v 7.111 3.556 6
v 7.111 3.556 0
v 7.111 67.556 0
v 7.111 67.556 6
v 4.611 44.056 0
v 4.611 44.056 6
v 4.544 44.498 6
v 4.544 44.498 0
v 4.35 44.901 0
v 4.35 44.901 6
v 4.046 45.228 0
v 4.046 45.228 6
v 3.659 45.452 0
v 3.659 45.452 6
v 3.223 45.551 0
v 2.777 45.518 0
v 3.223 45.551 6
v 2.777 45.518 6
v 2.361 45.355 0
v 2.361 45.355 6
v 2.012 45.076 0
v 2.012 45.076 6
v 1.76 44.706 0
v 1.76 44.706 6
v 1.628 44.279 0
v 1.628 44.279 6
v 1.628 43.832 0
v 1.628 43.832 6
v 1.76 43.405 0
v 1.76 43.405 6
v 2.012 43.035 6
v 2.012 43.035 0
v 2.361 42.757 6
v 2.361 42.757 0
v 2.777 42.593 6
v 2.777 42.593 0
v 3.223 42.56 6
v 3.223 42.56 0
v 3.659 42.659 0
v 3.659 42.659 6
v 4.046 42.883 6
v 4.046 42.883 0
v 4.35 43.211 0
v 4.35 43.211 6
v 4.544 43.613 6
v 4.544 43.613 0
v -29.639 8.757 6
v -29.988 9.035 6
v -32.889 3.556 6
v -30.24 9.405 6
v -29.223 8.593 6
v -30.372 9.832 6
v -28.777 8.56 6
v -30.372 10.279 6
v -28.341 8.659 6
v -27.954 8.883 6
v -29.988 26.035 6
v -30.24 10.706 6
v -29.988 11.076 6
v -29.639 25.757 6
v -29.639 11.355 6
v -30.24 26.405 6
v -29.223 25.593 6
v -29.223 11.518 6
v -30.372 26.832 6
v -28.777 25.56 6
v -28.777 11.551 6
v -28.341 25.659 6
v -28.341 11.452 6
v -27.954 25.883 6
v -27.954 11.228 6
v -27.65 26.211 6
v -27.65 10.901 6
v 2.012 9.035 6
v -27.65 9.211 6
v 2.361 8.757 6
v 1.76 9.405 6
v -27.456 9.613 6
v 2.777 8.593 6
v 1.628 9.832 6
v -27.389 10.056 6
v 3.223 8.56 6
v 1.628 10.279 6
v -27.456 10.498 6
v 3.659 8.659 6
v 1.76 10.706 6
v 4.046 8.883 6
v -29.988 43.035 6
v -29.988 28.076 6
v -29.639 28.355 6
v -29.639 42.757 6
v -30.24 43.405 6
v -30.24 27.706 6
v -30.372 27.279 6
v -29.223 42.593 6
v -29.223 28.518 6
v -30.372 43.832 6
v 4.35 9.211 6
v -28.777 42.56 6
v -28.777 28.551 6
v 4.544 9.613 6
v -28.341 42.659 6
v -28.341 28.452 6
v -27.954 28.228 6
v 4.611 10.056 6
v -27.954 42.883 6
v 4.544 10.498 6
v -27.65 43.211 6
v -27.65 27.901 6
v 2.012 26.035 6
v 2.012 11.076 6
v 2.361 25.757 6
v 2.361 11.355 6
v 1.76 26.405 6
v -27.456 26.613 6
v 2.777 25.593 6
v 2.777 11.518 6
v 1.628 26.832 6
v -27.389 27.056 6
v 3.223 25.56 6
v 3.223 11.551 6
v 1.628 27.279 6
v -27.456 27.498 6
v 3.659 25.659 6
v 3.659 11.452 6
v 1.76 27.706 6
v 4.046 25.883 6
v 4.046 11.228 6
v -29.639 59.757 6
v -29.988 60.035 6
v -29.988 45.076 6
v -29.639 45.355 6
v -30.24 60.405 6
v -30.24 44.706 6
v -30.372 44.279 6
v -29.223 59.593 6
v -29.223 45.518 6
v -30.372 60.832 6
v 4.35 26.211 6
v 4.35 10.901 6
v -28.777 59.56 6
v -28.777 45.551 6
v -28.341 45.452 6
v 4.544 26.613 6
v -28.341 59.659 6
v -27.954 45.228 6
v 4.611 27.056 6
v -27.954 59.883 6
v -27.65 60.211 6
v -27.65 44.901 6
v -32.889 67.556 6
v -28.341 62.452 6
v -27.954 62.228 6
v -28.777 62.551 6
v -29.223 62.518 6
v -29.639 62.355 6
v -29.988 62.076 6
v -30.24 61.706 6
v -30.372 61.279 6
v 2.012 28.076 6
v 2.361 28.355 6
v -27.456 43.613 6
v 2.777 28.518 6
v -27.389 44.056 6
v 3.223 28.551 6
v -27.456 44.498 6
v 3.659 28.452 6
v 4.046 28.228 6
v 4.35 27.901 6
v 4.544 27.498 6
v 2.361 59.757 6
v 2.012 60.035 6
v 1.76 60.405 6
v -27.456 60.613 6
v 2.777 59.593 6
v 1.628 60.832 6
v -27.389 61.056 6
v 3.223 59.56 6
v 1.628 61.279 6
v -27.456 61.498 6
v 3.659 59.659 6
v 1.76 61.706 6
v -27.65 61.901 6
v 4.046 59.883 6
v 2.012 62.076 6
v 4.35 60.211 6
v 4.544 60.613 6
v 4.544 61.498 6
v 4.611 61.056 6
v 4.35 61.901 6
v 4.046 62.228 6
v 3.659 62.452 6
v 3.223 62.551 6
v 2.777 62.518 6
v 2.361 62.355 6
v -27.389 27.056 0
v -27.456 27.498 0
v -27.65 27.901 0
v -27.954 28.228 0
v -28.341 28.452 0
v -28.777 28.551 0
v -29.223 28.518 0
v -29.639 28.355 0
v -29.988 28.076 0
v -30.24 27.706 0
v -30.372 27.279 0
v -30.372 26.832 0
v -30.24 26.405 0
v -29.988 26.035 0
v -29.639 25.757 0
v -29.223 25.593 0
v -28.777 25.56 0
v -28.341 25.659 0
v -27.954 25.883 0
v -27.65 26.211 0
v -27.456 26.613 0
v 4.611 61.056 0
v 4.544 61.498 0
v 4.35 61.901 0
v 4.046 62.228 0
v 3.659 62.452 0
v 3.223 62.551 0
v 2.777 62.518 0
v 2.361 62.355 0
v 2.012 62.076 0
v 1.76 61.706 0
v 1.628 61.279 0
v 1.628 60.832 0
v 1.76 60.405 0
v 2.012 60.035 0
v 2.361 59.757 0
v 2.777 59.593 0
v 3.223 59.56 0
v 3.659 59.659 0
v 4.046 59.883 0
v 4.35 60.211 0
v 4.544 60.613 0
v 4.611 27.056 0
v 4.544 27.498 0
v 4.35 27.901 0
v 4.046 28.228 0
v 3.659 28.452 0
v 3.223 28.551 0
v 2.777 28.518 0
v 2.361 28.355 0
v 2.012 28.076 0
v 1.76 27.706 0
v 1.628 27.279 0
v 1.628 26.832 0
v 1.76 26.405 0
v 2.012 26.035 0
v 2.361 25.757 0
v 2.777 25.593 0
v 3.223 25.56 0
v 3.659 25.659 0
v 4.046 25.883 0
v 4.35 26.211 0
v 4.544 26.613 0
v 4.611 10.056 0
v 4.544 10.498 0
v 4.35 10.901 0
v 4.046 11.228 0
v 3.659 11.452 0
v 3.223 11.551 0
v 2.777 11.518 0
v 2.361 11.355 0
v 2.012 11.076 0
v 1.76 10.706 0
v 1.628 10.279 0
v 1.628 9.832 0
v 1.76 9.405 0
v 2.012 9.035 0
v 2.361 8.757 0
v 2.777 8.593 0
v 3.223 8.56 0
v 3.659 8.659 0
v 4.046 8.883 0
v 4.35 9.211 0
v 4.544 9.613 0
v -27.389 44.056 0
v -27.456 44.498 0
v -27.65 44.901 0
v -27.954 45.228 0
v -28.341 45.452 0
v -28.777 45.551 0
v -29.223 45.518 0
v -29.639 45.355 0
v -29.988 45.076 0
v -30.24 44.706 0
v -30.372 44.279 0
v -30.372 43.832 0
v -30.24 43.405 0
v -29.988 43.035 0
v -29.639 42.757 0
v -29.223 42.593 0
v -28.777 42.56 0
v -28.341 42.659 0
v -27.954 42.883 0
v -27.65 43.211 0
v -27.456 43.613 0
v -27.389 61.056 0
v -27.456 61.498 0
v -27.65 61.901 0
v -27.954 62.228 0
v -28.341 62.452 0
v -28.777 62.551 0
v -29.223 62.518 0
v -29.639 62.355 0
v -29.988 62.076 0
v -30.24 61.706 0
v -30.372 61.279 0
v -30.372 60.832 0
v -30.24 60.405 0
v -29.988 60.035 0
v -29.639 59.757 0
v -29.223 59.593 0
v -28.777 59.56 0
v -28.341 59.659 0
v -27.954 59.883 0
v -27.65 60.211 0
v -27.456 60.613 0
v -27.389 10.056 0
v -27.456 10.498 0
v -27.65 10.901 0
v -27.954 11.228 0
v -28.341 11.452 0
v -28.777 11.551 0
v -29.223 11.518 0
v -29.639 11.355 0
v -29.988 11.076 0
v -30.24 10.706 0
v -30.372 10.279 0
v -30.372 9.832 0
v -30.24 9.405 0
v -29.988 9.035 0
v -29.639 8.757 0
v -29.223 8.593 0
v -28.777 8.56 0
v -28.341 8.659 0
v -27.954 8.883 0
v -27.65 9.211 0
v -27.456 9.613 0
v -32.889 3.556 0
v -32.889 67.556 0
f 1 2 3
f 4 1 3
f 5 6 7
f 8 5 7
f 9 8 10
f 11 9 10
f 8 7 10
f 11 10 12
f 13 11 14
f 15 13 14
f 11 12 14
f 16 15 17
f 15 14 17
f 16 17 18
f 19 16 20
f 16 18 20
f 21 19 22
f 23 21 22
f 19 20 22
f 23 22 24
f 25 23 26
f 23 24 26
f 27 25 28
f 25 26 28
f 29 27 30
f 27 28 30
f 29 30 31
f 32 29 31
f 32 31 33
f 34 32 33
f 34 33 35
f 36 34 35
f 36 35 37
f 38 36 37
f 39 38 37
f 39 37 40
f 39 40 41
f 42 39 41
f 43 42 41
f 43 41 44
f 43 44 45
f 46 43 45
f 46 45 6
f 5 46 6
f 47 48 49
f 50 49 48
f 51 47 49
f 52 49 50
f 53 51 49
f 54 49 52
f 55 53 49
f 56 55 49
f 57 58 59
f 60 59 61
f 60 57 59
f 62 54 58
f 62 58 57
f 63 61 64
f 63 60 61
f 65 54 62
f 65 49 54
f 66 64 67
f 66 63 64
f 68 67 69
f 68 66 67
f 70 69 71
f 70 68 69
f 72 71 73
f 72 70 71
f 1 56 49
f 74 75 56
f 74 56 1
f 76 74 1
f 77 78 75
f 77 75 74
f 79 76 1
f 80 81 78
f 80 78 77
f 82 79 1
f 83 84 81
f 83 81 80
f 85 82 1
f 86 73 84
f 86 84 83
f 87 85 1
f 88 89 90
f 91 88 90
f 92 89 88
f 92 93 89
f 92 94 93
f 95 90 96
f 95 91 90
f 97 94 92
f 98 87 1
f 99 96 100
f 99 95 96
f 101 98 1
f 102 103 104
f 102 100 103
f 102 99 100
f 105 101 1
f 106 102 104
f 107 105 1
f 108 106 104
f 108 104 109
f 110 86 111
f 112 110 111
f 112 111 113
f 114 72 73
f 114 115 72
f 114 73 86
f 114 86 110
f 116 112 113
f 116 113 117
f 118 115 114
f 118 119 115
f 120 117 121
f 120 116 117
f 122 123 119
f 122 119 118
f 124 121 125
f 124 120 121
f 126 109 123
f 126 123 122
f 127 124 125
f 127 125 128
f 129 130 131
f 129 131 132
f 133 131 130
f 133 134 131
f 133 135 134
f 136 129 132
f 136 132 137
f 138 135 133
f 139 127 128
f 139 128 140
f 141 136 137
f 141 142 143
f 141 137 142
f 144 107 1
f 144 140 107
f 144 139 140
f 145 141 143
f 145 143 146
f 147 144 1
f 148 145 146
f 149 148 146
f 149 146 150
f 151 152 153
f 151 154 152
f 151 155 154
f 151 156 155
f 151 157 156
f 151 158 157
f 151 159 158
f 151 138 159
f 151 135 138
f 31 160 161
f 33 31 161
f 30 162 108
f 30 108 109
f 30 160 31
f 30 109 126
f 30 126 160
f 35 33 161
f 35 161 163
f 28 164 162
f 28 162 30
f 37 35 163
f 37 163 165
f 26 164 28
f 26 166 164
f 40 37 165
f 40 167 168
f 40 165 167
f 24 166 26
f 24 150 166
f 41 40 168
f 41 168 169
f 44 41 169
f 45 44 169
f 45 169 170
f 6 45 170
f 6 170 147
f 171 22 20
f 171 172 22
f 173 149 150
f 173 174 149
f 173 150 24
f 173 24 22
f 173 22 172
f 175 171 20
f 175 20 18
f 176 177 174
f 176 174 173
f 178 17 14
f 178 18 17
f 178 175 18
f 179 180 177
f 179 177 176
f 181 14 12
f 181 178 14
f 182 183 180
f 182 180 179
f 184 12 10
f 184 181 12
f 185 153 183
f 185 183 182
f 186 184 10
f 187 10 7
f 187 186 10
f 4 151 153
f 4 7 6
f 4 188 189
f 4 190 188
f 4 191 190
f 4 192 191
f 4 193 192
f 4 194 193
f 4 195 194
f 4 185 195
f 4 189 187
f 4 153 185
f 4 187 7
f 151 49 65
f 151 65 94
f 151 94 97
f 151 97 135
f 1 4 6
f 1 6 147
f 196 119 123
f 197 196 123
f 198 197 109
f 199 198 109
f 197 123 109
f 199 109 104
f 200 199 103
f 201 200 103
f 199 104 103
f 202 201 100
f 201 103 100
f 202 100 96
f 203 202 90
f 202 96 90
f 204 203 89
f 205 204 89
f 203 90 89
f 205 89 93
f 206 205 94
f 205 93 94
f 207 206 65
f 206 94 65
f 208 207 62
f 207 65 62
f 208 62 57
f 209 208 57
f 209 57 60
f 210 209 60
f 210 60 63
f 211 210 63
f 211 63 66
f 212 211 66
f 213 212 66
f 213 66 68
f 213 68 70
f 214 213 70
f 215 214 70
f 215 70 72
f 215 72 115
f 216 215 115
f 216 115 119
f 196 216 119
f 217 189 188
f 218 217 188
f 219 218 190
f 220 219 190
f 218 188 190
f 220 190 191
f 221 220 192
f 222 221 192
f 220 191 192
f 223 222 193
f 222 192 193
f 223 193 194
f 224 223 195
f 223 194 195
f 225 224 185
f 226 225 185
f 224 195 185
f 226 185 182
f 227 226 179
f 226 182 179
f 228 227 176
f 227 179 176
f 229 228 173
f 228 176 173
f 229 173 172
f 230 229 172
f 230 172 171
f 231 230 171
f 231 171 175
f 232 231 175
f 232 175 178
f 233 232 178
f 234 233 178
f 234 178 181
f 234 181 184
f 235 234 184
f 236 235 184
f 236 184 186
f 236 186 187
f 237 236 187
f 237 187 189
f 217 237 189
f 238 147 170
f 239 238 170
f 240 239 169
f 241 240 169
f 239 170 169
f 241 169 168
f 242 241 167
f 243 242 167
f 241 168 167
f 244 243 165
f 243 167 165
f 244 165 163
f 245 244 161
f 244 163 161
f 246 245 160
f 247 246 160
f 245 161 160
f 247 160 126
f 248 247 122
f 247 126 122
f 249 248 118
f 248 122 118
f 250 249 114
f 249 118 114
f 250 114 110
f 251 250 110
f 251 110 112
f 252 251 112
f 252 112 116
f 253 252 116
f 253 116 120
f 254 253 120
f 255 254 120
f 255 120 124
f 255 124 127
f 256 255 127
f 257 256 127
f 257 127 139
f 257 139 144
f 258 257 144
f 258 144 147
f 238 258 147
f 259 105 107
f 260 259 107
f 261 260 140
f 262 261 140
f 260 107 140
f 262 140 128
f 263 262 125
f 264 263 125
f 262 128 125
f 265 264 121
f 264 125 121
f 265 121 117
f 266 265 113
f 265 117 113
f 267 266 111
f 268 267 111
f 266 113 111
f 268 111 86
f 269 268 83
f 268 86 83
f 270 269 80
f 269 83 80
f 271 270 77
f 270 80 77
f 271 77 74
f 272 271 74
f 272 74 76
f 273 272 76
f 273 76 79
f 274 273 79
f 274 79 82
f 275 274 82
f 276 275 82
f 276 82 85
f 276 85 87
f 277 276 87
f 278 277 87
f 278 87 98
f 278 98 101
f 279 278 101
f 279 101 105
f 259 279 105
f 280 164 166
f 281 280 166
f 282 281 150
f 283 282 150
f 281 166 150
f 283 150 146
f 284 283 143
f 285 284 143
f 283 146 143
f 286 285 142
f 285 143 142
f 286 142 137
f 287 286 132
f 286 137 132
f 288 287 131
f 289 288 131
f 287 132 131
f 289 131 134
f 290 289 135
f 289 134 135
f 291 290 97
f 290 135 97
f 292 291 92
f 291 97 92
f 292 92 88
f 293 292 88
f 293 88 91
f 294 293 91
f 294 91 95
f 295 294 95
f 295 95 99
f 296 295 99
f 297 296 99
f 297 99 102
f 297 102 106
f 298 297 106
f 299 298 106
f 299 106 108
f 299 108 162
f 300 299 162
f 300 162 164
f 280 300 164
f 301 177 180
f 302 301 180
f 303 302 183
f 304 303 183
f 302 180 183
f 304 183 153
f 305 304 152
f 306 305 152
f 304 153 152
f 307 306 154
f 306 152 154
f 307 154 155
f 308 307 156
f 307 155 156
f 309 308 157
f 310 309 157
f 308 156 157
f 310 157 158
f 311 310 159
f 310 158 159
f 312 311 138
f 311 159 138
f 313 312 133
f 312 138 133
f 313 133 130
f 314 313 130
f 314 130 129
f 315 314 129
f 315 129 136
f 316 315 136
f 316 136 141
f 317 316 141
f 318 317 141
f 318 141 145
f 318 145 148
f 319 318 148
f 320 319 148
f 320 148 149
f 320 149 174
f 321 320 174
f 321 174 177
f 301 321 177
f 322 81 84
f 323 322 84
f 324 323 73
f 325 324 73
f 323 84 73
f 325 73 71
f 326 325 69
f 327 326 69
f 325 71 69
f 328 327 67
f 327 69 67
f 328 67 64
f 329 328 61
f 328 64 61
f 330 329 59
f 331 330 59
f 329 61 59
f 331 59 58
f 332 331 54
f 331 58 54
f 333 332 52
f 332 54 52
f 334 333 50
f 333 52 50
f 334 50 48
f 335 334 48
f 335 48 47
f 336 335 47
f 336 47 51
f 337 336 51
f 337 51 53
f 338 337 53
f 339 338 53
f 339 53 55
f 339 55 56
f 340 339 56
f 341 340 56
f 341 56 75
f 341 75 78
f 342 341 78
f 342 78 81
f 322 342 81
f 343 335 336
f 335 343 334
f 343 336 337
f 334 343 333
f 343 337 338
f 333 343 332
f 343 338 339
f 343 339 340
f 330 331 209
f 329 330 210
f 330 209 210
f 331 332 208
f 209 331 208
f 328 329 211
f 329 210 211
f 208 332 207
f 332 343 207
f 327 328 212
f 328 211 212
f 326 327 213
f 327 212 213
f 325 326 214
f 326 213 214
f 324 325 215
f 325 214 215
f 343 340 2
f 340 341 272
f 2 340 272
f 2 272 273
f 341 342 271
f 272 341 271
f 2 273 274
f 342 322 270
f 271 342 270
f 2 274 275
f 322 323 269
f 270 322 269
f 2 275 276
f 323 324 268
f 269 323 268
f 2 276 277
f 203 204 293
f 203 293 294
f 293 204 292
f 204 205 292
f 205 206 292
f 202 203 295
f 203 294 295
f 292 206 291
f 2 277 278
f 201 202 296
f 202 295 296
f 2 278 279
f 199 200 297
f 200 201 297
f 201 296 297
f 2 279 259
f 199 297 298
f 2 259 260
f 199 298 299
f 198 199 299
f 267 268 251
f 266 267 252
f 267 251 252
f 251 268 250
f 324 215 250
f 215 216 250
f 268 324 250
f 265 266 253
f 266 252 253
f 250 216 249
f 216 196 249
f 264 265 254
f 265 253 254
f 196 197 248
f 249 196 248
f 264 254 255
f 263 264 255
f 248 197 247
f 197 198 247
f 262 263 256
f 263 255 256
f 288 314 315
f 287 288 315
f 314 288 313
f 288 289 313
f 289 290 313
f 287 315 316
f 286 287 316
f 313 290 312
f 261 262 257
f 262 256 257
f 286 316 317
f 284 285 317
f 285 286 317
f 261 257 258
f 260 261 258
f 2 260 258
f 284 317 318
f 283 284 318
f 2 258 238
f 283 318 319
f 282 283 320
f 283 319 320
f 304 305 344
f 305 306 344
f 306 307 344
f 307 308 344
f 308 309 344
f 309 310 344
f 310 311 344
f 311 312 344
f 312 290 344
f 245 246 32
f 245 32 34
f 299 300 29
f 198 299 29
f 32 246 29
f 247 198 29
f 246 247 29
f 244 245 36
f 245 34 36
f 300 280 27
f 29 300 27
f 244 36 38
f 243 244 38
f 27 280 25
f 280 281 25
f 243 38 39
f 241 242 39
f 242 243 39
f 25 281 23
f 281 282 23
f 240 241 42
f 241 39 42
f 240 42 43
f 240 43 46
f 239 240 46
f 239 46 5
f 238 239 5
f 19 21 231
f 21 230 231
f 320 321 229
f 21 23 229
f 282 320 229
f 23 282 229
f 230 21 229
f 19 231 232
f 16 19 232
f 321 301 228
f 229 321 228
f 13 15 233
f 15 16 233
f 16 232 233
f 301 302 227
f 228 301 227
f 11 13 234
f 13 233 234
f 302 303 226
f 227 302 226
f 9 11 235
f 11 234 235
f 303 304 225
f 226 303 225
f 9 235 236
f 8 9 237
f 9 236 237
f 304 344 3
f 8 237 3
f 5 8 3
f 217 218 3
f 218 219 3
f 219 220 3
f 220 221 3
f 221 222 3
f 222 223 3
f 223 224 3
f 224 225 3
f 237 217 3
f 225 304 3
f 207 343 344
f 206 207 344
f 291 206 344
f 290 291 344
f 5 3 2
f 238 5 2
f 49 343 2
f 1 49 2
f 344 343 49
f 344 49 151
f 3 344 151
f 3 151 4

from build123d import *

# Parameters (mm, degrees)
SKETCH1_W               = 40
SKETCH1_H               = 64
BOSS_EXTRUDE1_DEPTH     = 6
SKETCH2_R               = 1.5
CUT_EXTRUDE1_DEPTH      = 1
CUT_EXTRUDE1_DEPTH_BACK = 7


with BuildPart() as part:
    # Sketch1 → Boss-Extrude1 (new body)
    with BuildSketch(Plane.XY):
        with Locations((-12.888888889, 35.555555556)):
            Rectangle(SKETCH1_W, SKETCH1_H)
    extrude(amount=BOSS_EXTRUDE1_DEPTH)

    # Sketch2 → Cut-Extrude1 (cut, two sides)
    with BuildSketch(Plane.XY.offset(6)) as cut_extrude1_sk:
        with Locations((-28.888888889, 10.055555556)):
            Circle(SKETCH2_R)
        with Locations((-28.888888889, 27.055555556)):
            Circle(SKETCH2_R)
        with Locations((-28.888888889, 44.055555556)):
            Circle(SKETCH2_R)
        with Locations((-28.888888889, 61.055555556)):
            Circle(SKETCH2_R)
        with Locations((3.111111111, 10.055555556)):
            Circle(SKETCH2_R)
        with Locations((3.111111111, 27.055555556)):
            Circle(SKETCH2_R)
        with Locations((3.111111111, 44.055555556)):
            Circle(SKETCH2_R)
        with Locations((3.111111111, 61.055555556)):
            Circle(SKETCH2_R)
    extrude(amount=CUT_EXTRUDE1_DEPTH, mode=Mode.SUBTRACT)
    extrude(cut_extrude1_sk.sketch, amount=-CUT_EXTRUDE1_DEPTH_BACK, mode=Mode.SUBTRACT)


solid = part.part
